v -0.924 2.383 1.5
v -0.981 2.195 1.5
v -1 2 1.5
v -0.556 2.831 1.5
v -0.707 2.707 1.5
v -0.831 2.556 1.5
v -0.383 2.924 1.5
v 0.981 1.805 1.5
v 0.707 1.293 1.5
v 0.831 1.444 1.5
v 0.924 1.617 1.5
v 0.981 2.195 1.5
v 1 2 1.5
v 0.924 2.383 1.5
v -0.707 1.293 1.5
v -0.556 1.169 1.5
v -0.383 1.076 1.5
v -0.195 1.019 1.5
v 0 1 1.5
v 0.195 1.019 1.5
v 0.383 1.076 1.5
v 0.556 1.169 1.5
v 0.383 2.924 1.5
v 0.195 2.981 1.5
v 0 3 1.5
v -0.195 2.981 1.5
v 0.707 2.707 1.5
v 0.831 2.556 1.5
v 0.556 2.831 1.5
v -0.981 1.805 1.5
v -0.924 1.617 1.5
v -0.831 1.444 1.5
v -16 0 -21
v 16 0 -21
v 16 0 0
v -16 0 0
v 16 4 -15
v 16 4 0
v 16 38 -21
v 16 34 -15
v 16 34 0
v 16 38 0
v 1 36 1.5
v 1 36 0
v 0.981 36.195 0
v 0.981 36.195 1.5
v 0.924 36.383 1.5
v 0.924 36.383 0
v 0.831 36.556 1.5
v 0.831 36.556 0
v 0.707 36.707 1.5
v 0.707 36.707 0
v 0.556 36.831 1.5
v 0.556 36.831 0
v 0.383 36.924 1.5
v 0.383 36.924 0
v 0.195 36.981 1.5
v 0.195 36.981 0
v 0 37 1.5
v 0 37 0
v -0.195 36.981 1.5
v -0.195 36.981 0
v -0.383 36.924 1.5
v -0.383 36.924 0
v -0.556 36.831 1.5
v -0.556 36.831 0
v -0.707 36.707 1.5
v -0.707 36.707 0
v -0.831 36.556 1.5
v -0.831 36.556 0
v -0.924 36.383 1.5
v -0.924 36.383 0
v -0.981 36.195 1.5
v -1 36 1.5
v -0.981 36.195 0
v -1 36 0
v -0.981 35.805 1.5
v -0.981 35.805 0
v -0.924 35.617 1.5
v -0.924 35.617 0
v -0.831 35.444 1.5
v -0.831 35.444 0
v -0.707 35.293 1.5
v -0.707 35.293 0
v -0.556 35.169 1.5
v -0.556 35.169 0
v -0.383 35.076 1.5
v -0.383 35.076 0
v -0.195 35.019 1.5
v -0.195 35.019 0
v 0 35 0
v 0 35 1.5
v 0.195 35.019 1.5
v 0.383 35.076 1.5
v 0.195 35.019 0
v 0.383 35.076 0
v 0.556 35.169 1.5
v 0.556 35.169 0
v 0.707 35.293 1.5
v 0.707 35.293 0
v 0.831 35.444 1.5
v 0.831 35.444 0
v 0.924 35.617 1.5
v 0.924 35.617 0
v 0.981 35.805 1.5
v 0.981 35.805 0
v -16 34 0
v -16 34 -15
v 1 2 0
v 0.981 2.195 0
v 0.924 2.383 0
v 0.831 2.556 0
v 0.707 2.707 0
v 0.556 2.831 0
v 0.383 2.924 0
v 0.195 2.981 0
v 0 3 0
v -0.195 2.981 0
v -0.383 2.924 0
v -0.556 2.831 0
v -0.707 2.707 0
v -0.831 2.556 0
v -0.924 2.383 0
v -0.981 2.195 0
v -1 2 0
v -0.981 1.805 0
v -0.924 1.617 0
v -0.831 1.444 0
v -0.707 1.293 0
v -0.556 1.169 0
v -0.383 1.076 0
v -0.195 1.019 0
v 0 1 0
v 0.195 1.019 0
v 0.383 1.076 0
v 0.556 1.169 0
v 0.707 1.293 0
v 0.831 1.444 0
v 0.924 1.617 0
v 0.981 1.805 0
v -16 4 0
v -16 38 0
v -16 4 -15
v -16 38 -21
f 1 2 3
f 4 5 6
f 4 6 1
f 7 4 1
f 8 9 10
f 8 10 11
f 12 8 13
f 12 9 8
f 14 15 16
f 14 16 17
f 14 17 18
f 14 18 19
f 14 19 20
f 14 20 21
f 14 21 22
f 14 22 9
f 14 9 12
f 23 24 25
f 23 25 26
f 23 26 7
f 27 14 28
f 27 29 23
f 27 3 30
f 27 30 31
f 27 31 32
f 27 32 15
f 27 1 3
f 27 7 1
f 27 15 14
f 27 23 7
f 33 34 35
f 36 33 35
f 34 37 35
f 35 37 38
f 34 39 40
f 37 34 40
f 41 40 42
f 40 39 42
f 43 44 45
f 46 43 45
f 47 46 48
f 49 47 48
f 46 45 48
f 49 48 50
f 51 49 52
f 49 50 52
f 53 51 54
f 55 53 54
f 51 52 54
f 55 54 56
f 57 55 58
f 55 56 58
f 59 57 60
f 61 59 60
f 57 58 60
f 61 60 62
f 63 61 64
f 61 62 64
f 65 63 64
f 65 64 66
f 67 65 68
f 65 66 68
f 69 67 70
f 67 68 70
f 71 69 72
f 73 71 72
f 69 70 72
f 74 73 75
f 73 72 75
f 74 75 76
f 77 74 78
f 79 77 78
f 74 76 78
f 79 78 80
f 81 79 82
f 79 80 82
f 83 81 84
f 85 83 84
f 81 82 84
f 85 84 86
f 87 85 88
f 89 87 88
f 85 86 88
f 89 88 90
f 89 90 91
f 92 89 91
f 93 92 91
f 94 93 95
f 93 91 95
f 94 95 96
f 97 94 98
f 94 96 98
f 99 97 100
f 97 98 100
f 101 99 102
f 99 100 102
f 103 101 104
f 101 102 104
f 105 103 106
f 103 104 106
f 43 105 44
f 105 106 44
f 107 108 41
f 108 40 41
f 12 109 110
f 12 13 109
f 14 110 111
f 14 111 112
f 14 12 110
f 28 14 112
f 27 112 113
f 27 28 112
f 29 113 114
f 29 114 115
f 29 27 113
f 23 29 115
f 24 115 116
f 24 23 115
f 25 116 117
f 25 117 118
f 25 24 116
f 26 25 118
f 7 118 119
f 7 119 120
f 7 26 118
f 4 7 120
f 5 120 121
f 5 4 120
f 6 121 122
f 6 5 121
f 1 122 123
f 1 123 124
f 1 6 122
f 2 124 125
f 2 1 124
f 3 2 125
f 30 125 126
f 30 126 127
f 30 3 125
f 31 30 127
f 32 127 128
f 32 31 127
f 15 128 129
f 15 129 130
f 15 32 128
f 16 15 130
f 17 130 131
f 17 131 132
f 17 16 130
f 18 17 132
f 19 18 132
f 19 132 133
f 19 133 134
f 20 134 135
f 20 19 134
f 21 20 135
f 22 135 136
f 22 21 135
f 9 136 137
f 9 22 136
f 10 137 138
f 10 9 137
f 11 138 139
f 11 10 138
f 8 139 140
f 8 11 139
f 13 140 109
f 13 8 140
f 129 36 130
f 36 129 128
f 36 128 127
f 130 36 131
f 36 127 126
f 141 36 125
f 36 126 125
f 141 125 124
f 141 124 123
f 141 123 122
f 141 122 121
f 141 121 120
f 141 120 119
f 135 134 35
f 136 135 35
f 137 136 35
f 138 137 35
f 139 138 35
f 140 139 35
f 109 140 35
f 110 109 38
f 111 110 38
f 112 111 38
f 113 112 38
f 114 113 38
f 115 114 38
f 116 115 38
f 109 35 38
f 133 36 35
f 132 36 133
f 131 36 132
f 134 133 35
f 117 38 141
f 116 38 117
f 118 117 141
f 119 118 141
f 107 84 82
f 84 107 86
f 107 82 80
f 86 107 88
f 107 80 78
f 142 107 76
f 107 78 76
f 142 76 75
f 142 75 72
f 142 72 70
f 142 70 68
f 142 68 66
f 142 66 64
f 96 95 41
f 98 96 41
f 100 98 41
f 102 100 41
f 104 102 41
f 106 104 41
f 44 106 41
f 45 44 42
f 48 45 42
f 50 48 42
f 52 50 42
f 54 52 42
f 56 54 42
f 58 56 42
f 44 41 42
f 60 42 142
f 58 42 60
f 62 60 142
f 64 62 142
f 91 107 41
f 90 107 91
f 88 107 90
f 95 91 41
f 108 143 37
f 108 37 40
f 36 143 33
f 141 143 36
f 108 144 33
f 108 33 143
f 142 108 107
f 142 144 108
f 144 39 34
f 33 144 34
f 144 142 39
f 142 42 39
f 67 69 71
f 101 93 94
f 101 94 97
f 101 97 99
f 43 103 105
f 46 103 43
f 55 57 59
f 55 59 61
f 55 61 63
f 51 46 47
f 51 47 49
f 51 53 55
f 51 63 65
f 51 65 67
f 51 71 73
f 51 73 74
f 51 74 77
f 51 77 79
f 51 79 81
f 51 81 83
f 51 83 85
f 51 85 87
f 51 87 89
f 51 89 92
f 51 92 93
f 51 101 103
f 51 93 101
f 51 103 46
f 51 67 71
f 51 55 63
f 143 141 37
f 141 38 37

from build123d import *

# Parameters (mm, degrees)
BOSS_EXTRUDE1_DEPTH = 16
SKETCH4_R           = 1
BOSS_EXTRUDE2_DEPTH = 1.5


with BuildPart() as part:
    # Sketch3 → Boss-Extrude1 (new body, symmetric)
    with BuildSketch(Plane(origin=(0, 0, 0), x_dir=(0, 0, -1), z_dir=(1, 0, 0))):
        Polygon((0, 0), (0, 4), (15, 4), (15, 34), (0, 34), (0, 38), (21, 38), (21, 0), align=None)
    extrude(amount=BOSS_EXTRUDE1_DEPTH, both=True)

    # Sketch4 → Boss-Extrude2 (add, symmetric)
    with BuildSketch(Plane.XY):
        with Locations((0, 36)):
            Circle(SKETCH4_R)
        with Locations((0, 2)):
            Circle(SKETCH4_R)
    extrude(amount=BOSS_EXTRUDE2_DEPTH, both=True)


solid = part.part
